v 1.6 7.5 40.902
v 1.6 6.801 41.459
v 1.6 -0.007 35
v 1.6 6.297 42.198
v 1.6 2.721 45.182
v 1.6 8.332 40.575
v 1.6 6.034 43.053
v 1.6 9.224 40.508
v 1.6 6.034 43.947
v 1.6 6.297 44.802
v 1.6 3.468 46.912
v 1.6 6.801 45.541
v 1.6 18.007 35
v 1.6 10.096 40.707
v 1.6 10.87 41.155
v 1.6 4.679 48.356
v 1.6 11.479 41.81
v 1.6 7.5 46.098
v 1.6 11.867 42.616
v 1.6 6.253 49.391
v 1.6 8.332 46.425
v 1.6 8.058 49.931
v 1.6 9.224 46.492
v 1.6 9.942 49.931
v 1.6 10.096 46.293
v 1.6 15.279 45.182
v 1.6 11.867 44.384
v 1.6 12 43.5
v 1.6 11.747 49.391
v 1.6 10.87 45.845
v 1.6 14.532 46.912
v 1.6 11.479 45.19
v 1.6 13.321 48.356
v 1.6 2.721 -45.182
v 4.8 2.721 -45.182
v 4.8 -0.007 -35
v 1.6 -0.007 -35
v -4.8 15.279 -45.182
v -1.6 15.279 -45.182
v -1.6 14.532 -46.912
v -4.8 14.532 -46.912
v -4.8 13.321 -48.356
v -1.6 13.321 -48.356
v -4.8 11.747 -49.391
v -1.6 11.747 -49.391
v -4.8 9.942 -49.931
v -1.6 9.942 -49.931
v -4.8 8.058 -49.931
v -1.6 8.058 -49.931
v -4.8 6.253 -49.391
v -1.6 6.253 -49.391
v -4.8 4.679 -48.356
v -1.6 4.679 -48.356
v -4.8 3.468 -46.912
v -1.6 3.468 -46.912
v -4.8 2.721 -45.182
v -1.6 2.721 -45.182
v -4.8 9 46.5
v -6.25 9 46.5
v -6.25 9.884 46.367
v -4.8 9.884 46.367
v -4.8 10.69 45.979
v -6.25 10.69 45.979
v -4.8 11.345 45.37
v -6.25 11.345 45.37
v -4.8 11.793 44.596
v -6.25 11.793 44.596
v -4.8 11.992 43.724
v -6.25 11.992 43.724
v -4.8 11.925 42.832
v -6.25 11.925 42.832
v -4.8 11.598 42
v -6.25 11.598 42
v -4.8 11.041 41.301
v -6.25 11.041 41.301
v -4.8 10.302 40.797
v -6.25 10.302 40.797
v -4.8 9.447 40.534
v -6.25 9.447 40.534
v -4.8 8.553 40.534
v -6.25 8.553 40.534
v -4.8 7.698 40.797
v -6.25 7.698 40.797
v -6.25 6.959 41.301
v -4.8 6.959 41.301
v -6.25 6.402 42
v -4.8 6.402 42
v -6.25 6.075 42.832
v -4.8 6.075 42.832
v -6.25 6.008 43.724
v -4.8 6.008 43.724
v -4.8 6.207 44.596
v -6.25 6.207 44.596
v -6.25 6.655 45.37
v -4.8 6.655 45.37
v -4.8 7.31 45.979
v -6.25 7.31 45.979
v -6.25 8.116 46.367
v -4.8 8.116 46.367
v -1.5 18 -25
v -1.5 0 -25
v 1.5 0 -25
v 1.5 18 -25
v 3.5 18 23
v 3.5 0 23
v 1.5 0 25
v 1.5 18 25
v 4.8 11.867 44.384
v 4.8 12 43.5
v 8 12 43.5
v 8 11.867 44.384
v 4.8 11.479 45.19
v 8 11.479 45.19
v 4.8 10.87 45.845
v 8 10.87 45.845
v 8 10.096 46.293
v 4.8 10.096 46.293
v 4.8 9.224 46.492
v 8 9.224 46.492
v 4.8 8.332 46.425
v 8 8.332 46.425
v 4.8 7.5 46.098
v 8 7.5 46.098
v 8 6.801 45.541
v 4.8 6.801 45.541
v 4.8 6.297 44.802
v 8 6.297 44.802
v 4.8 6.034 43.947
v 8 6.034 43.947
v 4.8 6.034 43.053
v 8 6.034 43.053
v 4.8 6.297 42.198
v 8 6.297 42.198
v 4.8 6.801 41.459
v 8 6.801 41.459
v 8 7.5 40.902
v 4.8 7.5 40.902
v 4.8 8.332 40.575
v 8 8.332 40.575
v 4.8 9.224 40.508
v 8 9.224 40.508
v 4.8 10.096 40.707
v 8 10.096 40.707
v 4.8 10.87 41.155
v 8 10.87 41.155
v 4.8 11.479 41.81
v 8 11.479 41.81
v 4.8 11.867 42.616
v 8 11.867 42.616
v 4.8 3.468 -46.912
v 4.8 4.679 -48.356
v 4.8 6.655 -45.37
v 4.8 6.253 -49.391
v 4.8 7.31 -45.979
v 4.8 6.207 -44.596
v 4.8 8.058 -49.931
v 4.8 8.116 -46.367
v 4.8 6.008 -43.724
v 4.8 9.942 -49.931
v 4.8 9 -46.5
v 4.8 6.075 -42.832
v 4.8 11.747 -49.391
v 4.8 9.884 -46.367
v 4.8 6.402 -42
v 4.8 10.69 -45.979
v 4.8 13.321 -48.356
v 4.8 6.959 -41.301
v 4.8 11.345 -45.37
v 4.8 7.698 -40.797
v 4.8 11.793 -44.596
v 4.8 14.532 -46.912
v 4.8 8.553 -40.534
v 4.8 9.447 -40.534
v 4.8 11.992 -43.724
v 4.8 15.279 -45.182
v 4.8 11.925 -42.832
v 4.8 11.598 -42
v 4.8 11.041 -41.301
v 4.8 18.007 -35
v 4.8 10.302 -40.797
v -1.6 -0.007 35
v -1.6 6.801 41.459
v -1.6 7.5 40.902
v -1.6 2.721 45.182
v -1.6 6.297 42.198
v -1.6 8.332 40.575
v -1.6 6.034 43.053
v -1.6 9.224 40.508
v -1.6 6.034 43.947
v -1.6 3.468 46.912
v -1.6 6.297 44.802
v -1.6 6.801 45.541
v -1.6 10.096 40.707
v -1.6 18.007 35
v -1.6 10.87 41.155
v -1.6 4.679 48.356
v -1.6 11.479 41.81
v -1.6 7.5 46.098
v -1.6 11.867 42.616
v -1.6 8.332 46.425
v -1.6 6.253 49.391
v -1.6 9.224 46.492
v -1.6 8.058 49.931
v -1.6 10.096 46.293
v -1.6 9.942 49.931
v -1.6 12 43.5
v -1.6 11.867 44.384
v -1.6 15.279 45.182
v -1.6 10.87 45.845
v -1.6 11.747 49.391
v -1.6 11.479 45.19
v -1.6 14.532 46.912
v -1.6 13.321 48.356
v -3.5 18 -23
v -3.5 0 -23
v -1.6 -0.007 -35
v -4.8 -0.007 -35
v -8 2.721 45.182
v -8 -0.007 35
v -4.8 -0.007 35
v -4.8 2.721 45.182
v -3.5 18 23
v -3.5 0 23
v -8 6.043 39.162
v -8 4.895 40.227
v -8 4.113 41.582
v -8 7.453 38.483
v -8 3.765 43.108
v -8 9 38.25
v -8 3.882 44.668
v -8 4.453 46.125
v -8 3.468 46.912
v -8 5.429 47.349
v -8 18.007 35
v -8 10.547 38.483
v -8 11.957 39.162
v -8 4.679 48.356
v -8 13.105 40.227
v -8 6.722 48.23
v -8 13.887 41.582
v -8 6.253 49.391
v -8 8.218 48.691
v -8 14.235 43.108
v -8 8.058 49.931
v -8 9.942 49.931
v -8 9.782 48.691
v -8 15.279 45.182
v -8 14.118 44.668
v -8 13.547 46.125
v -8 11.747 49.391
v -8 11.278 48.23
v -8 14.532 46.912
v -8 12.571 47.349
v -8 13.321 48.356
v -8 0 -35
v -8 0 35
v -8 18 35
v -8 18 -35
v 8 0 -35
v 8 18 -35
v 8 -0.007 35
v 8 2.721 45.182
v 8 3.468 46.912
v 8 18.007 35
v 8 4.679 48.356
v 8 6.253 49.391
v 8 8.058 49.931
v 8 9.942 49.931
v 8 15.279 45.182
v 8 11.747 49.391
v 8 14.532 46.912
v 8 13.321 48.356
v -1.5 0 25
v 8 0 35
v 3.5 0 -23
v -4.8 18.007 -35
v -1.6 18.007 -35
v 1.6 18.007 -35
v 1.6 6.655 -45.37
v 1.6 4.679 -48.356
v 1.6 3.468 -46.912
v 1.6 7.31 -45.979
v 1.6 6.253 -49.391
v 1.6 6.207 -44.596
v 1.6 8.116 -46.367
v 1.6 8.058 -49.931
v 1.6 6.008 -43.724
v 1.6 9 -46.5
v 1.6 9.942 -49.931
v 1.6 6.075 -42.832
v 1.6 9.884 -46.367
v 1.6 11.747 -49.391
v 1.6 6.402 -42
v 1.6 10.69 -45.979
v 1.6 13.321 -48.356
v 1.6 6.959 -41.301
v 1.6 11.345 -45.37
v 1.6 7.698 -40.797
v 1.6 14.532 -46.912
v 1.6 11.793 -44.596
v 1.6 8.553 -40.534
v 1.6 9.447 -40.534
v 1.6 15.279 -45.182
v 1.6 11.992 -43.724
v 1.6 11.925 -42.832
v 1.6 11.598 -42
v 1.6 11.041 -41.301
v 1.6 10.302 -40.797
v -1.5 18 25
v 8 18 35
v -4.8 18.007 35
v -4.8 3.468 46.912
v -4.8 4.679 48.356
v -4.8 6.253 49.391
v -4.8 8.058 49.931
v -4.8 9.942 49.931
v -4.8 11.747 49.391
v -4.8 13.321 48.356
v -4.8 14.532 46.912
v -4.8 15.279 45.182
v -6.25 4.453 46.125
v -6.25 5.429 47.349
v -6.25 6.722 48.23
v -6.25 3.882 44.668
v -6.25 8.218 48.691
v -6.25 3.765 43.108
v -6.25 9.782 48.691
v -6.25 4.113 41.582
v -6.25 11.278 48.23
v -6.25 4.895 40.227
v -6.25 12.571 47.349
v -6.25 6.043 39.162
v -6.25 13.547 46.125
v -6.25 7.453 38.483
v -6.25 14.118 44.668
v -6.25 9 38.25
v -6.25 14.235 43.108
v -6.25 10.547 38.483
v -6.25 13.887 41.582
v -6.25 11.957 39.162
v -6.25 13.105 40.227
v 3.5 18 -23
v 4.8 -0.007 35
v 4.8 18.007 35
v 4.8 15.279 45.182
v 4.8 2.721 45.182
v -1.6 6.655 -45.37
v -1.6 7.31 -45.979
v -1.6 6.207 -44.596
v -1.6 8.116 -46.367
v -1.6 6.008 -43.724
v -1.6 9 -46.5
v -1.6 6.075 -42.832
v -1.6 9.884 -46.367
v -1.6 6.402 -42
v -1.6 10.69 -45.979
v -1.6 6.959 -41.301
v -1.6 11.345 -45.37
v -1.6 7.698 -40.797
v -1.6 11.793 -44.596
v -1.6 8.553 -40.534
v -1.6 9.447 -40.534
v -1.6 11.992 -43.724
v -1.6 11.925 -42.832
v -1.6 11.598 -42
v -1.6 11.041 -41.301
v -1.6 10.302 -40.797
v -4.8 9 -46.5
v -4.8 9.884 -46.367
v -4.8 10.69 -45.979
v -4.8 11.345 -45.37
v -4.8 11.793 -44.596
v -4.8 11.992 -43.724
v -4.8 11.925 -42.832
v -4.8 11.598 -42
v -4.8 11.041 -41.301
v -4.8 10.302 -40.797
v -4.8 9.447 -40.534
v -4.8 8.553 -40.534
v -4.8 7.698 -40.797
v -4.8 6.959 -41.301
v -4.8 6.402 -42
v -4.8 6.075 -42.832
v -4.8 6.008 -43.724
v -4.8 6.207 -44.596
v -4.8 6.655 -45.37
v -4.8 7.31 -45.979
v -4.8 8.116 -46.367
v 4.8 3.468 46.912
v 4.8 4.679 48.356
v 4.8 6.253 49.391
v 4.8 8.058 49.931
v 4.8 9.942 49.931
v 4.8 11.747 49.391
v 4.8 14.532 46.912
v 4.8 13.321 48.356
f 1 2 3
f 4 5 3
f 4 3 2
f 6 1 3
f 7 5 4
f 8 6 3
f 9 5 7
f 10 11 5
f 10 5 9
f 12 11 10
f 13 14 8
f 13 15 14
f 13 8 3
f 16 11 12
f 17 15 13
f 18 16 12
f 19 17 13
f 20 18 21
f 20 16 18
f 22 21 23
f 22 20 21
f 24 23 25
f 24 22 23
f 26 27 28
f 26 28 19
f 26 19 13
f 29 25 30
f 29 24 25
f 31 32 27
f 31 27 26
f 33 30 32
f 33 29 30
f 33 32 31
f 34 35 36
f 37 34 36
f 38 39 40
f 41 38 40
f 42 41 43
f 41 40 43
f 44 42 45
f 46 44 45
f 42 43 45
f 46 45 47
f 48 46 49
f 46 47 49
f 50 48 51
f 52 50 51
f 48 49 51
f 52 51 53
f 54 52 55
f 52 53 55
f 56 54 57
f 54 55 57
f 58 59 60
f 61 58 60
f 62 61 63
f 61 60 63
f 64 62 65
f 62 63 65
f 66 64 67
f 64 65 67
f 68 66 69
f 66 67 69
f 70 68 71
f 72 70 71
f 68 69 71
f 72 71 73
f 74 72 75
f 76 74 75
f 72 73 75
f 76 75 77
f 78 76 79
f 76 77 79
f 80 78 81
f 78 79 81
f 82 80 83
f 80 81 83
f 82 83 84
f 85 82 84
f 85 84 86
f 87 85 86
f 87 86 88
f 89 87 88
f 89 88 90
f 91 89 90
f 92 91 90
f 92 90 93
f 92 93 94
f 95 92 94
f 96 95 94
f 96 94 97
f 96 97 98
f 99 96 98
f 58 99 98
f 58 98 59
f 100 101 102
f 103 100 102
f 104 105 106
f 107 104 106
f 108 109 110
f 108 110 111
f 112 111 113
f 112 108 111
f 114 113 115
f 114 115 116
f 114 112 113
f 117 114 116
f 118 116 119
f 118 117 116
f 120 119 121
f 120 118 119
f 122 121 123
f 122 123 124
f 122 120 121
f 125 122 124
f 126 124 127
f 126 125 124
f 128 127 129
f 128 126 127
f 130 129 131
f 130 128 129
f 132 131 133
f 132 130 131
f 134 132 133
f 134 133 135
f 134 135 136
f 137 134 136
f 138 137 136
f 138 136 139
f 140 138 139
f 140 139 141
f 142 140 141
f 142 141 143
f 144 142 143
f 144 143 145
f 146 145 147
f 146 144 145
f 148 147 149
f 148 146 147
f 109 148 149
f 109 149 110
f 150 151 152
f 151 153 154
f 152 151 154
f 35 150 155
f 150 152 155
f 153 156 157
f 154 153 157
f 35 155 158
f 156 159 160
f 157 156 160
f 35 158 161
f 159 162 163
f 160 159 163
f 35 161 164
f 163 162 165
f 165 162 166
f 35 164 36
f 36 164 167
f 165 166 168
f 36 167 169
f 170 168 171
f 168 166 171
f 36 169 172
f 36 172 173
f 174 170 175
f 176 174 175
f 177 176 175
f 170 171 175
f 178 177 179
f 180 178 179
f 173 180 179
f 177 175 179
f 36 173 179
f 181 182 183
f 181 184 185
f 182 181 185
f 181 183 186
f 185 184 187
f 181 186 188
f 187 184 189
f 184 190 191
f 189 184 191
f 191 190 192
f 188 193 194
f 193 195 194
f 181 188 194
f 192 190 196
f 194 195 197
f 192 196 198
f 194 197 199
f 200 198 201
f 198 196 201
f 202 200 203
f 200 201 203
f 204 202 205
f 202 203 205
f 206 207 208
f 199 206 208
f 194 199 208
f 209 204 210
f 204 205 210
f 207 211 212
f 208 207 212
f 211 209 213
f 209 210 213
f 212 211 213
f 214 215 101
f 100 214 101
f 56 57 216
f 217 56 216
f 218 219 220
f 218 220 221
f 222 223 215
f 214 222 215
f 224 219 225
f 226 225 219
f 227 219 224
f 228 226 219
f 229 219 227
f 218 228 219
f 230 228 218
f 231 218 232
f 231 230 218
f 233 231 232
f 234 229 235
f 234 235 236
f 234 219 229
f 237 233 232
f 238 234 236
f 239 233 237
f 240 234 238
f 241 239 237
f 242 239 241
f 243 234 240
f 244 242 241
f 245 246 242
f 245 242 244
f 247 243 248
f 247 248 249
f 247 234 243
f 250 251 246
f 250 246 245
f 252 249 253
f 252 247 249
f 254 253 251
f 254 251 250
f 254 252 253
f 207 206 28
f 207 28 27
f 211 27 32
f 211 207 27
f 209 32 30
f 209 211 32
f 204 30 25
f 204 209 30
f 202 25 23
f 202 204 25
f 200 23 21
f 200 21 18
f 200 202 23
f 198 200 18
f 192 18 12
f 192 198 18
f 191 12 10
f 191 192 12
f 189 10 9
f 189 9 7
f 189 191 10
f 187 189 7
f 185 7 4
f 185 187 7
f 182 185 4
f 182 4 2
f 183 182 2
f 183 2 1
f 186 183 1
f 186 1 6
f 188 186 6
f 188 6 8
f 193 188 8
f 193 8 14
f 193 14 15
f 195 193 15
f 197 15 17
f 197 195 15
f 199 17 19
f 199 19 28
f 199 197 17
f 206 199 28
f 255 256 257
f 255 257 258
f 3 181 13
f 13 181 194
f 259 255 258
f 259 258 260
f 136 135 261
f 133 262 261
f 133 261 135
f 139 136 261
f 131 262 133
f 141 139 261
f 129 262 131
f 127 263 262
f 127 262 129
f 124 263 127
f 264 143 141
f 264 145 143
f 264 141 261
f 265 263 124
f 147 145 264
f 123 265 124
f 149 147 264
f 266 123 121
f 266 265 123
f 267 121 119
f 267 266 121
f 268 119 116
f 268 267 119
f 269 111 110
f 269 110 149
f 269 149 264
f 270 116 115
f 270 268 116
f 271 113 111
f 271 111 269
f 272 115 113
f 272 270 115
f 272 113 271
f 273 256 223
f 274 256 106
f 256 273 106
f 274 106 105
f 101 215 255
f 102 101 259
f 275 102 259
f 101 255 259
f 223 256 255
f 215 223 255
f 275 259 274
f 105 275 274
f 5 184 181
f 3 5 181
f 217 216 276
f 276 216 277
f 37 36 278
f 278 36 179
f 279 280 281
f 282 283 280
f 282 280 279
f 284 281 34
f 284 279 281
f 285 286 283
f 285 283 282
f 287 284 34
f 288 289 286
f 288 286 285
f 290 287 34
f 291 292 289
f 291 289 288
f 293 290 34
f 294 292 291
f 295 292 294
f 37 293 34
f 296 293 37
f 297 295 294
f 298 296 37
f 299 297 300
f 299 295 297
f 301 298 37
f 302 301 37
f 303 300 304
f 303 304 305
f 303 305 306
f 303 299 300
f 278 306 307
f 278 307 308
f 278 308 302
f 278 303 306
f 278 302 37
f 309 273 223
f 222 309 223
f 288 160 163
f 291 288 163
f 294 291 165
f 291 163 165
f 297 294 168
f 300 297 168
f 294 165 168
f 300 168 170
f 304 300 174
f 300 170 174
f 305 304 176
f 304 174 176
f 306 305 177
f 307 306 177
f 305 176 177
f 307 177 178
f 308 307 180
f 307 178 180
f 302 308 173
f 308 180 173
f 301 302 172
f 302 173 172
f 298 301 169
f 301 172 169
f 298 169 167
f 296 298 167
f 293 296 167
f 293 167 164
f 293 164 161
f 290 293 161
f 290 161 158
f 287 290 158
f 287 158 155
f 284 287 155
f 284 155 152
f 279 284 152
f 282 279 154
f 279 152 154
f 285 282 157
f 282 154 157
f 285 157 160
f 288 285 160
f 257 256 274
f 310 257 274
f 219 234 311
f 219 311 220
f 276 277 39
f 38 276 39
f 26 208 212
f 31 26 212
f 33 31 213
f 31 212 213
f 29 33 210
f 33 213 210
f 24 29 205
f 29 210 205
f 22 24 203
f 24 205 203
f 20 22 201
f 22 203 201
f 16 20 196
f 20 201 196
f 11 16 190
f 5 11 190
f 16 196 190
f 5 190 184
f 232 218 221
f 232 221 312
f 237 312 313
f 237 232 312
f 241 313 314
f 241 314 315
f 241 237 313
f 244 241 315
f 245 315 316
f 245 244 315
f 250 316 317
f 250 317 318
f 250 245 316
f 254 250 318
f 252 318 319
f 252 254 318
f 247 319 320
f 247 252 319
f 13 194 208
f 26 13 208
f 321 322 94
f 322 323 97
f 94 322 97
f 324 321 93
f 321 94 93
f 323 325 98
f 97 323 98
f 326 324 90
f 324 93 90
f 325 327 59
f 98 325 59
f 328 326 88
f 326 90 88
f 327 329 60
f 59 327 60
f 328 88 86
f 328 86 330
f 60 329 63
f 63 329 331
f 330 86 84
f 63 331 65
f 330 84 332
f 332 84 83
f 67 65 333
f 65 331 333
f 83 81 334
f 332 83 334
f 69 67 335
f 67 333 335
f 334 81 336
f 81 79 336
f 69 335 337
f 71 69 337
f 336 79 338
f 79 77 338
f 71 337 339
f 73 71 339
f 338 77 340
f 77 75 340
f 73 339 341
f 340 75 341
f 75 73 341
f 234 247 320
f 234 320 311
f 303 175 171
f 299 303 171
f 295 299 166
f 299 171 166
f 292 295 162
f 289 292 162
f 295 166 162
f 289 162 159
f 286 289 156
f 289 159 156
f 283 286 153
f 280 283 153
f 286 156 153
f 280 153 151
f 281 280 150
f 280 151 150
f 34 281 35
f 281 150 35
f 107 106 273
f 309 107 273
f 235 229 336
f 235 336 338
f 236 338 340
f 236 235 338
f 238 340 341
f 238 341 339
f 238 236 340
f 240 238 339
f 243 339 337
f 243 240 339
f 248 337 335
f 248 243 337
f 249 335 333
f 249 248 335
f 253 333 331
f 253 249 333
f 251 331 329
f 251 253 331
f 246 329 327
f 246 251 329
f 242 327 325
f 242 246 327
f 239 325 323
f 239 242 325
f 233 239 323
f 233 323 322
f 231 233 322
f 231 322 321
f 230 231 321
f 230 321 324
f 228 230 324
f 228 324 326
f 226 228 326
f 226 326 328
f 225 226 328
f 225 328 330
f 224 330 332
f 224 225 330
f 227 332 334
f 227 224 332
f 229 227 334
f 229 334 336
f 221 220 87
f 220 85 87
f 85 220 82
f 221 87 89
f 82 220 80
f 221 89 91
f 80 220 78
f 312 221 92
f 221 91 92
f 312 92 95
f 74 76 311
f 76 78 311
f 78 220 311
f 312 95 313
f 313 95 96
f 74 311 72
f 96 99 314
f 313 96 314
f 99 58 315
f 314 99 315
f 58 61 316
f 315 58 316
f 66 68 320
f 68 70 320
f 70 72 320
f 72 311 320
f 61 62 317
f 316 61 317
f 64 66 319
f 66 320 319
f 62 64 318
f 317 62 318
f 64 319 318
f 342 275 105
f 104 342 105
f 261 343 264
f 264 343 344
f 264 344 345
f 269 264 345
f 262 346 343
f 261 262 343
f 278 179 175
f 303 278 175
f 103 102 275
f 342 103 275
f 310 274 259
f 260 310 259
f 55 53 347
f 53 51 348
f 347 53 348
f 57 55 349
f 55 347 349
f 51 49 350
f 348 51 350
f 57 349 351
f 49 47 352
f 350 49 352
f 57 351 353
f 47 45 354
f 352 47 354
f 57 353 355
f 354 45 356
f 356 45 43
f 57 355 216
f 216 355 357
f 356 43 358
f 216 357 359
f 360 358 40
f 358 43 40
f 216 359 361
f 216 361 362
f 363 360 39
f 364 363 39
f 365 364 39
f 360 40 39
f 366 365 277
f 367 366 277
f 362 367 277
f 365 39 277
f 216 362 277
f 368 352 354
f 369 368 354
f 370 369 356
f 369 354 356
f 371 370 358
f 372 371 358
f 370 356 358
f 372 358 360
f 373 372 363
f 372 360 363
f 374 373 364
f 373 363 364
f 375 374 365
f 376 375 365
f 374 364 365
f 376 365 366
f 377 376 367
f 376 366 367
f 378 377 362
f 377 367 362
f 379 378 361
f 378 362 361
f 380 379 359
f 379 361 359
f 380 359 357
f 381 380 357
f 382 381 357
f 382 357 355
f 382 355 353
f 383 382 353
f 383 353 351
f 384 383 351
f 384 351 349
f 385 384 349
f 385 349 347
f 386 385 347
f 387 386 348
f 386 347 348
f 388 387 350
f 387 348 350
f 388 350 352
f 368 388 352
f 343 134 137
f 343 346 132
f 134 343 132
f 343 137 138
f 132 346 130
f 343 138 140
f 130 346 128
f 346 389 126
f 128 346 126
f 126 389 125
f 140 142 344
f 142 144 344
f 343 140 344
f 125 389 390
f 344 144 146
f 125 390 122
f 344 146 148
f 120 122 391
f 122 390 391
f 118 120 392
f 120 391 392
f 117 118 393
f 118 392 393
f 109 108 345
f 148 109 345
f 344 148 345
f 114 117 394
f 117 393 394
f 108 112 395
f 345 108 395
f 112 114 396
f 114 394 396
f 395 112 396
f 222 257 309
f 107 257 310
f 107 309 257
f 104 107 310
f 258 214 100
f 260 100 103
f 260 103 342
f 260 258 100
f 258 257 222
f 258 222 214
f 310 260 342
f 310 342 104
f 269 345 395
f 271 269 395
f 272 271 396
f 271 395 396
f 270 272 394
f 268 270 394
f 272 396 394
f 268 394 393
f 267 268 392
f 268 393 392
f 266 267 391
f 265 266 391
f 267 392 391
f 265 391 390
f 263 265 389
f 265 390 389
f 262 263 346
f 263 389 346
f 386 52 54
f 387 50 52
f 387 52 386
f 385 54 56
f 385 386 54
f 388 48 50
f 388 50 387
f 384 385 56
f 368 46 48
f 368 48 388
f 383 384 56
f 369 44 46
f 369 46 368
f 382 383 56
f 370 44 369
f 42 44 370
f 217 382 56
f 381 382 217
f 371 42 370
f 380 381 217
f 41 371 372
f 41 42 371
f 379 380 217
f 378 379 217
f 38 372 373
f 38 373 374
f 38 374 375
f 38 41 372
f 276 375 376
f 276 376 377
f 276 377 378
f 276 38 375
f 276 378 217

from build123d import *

# Parameters (mm, degrees)
SKETCH1_W                   = 16
SKETCH1_H                   = 70
BOSS_EXTRUDE1_DEPTH         = 18
SKETCH2_R                   = 3
BOSS_EXTRUDE2_DEPTH         = 3.2
SKETCH3_R                   = 3
BOSS_EXTRUDE3_DEPTH         = 3.2
BODY_MOVE_COPY2_START       = -1.6
BODY_MOVE_COPY2_OUTLINE_R   = 3
BODY_MOVE_COPY2_DEPTH       = 3.2
BODY_MOVE_COPY2_START_2     = 4.8
BODY_MOVE_COPY2_2_OUTLINE_R = 3
BODY_MOVE_COPY2_2_DEPTH     = 3.2
SKETCH4_R                   = 5.25
CUT_EXTRUDE1_DEPTH          = 1.75


# Read off the part's stored shape, not the designer's step: Body-Move/Copy2
with BuildPart() as part:
    # Sketch1 → Boss-Extrude1 (new body)
    with BuildSketch(Plane(origin=(0, 0, 0), x_dir=(1, 0, 0), z_dir=(0, 1, 0))):
        Rectangle(SKETCH1_W, SKETCH1_H)
        Polygon((-3.5, 23), (-1.5, 25), (1.5, 25), (3.5, 23), (3.5, -23), (1.5, -25), (-1.5, -25), (-3.5, -23), align=None, mode=Mode.SUBTRACT)
    extrude(amount=BOSS_EXTRUDE1_DEPTH)


with BuildPart() as body_2:
    # Sketch2 → Boss-Extrude2 (new body)
    with BuildSketch(Plane(origin=(4.8, 0, 0), x_dir=(0, 0, -1), z_dir=(1, 0, 0))):
        with BuildLine():
            Line((45.182323793, 2.721482129), (35, -0.006863308))
            Line((35, -0.006863308), (35, 18.006863308))
            Line((35, 18.006863308), (45.182323793, 15.278517871))
            ThreePointArc((45.182323793, 15.278517871), (50, 9), (45.182323793, 2.721482129))
        make_face()
        with Locations((43.5, 9)):
            Circle(SKETCH2_R, mode=Mode.SUBTRACT)
    extrude(amount=-BOSS_EXTRUDE2_DEPTH)


with BuildPart() as body_3:
    # Body-Move/Copy1: copy of body 2
    add(body_2.part.moved(Location((-6.4, 0, 0))))


with BuildPart() as body_4:
    # Sketch3 → Boss-Extrude3 (new body)
    with BuildSketch(Plane.ZY.offset(8)):
        with BuildLine():
            Line((45.182323793, 15.278517871), (35, 18.006863308))
            Line((35, 18.006863308), (35, -0.006863308))
            Line((35, -0.006863308), (45.182323793, 2.721482129))
            ThreePointArc((45.182323793, 2.721482129), (50, 9), (45.182323793, 15.278517871))
        make_face()
        with Locations((43.5, 9)):
            Circle(SKETCH3_R, mode=Mode.SUBTRACT)
    extrude(amount=-BOSS_EXTRUDE3_DEPTH)

    # Sketch4 → Cut-Extrude1 (cut)
    with BuildSketch(Plane(origin=(-8, 0, 0), x_dir=(0, 0, -1), z_dir=(1, 0, 0))):
        with Locations((-43.5, 9)):
            Circle(SKETCH4_R)
    extrude(amount=CUT_EXTRUDE1_DEPTH, mode=Mode.SUBTRACT)


with BuildPart() as body_5:
    # Body-Move/Copy2 outline → Body-Move/Copy2 (new body)
    with BuildSketch(Plane.YZ.offset(BODY_MOVE_COPY2_START)):
        with BuildLine():
            ThreePointArc((15.278517871, 45.182323793), (9, 50), (2.721482129, 45.182323793))
            Line((2.721482129, 45.182323793), (-0.006863308, 35))
            Line((-0.006863308, 35), (18.006863308, 35))
            Line((18.006863308, 35), (15.278517871, 45.182323793))
        make_face()
        with Locations((9, 43.5)):
            Circle(BODY_MOVE_COPY2_OUTLINE_R, mode=Mode.SUBTRACT)
    extrude(amount=BODY_MOVE_COPY2_DEPTH)


with BuildPart() as body_6:
    # Body-Move_Copy2 2 outline → Body-Move_Copy2 2 (new body)
    with BuildSketch(Plane.YZ.offset(BODY_MOVE_COPY2_START_2)):
        with BuildLine():
            ThreePointArc((15.278517871, 45.182323793), (9, 50), (2.721482129, 45.182323793))
            Line((2.721482129, 45.182323793), (-0.006863308, 35))
            Line((-0.006863308, 35), (18.006863308, 35))
            Line((18.006863308, 35), (15.278517871, 45.182323793))
        make_face()
        with Locations((9, 43.5)):
            Circle(BODY_MOVE_COPY2_2_OUTLINE_R, mode=Mode.SUBTRACT)
    extrude(amount=BODY_MOVE_COPY2_2_DEPTH)


solid = Compound([part.part, body_2.part, body_3.part, body_4.part, body_5.part, body_6.part])
